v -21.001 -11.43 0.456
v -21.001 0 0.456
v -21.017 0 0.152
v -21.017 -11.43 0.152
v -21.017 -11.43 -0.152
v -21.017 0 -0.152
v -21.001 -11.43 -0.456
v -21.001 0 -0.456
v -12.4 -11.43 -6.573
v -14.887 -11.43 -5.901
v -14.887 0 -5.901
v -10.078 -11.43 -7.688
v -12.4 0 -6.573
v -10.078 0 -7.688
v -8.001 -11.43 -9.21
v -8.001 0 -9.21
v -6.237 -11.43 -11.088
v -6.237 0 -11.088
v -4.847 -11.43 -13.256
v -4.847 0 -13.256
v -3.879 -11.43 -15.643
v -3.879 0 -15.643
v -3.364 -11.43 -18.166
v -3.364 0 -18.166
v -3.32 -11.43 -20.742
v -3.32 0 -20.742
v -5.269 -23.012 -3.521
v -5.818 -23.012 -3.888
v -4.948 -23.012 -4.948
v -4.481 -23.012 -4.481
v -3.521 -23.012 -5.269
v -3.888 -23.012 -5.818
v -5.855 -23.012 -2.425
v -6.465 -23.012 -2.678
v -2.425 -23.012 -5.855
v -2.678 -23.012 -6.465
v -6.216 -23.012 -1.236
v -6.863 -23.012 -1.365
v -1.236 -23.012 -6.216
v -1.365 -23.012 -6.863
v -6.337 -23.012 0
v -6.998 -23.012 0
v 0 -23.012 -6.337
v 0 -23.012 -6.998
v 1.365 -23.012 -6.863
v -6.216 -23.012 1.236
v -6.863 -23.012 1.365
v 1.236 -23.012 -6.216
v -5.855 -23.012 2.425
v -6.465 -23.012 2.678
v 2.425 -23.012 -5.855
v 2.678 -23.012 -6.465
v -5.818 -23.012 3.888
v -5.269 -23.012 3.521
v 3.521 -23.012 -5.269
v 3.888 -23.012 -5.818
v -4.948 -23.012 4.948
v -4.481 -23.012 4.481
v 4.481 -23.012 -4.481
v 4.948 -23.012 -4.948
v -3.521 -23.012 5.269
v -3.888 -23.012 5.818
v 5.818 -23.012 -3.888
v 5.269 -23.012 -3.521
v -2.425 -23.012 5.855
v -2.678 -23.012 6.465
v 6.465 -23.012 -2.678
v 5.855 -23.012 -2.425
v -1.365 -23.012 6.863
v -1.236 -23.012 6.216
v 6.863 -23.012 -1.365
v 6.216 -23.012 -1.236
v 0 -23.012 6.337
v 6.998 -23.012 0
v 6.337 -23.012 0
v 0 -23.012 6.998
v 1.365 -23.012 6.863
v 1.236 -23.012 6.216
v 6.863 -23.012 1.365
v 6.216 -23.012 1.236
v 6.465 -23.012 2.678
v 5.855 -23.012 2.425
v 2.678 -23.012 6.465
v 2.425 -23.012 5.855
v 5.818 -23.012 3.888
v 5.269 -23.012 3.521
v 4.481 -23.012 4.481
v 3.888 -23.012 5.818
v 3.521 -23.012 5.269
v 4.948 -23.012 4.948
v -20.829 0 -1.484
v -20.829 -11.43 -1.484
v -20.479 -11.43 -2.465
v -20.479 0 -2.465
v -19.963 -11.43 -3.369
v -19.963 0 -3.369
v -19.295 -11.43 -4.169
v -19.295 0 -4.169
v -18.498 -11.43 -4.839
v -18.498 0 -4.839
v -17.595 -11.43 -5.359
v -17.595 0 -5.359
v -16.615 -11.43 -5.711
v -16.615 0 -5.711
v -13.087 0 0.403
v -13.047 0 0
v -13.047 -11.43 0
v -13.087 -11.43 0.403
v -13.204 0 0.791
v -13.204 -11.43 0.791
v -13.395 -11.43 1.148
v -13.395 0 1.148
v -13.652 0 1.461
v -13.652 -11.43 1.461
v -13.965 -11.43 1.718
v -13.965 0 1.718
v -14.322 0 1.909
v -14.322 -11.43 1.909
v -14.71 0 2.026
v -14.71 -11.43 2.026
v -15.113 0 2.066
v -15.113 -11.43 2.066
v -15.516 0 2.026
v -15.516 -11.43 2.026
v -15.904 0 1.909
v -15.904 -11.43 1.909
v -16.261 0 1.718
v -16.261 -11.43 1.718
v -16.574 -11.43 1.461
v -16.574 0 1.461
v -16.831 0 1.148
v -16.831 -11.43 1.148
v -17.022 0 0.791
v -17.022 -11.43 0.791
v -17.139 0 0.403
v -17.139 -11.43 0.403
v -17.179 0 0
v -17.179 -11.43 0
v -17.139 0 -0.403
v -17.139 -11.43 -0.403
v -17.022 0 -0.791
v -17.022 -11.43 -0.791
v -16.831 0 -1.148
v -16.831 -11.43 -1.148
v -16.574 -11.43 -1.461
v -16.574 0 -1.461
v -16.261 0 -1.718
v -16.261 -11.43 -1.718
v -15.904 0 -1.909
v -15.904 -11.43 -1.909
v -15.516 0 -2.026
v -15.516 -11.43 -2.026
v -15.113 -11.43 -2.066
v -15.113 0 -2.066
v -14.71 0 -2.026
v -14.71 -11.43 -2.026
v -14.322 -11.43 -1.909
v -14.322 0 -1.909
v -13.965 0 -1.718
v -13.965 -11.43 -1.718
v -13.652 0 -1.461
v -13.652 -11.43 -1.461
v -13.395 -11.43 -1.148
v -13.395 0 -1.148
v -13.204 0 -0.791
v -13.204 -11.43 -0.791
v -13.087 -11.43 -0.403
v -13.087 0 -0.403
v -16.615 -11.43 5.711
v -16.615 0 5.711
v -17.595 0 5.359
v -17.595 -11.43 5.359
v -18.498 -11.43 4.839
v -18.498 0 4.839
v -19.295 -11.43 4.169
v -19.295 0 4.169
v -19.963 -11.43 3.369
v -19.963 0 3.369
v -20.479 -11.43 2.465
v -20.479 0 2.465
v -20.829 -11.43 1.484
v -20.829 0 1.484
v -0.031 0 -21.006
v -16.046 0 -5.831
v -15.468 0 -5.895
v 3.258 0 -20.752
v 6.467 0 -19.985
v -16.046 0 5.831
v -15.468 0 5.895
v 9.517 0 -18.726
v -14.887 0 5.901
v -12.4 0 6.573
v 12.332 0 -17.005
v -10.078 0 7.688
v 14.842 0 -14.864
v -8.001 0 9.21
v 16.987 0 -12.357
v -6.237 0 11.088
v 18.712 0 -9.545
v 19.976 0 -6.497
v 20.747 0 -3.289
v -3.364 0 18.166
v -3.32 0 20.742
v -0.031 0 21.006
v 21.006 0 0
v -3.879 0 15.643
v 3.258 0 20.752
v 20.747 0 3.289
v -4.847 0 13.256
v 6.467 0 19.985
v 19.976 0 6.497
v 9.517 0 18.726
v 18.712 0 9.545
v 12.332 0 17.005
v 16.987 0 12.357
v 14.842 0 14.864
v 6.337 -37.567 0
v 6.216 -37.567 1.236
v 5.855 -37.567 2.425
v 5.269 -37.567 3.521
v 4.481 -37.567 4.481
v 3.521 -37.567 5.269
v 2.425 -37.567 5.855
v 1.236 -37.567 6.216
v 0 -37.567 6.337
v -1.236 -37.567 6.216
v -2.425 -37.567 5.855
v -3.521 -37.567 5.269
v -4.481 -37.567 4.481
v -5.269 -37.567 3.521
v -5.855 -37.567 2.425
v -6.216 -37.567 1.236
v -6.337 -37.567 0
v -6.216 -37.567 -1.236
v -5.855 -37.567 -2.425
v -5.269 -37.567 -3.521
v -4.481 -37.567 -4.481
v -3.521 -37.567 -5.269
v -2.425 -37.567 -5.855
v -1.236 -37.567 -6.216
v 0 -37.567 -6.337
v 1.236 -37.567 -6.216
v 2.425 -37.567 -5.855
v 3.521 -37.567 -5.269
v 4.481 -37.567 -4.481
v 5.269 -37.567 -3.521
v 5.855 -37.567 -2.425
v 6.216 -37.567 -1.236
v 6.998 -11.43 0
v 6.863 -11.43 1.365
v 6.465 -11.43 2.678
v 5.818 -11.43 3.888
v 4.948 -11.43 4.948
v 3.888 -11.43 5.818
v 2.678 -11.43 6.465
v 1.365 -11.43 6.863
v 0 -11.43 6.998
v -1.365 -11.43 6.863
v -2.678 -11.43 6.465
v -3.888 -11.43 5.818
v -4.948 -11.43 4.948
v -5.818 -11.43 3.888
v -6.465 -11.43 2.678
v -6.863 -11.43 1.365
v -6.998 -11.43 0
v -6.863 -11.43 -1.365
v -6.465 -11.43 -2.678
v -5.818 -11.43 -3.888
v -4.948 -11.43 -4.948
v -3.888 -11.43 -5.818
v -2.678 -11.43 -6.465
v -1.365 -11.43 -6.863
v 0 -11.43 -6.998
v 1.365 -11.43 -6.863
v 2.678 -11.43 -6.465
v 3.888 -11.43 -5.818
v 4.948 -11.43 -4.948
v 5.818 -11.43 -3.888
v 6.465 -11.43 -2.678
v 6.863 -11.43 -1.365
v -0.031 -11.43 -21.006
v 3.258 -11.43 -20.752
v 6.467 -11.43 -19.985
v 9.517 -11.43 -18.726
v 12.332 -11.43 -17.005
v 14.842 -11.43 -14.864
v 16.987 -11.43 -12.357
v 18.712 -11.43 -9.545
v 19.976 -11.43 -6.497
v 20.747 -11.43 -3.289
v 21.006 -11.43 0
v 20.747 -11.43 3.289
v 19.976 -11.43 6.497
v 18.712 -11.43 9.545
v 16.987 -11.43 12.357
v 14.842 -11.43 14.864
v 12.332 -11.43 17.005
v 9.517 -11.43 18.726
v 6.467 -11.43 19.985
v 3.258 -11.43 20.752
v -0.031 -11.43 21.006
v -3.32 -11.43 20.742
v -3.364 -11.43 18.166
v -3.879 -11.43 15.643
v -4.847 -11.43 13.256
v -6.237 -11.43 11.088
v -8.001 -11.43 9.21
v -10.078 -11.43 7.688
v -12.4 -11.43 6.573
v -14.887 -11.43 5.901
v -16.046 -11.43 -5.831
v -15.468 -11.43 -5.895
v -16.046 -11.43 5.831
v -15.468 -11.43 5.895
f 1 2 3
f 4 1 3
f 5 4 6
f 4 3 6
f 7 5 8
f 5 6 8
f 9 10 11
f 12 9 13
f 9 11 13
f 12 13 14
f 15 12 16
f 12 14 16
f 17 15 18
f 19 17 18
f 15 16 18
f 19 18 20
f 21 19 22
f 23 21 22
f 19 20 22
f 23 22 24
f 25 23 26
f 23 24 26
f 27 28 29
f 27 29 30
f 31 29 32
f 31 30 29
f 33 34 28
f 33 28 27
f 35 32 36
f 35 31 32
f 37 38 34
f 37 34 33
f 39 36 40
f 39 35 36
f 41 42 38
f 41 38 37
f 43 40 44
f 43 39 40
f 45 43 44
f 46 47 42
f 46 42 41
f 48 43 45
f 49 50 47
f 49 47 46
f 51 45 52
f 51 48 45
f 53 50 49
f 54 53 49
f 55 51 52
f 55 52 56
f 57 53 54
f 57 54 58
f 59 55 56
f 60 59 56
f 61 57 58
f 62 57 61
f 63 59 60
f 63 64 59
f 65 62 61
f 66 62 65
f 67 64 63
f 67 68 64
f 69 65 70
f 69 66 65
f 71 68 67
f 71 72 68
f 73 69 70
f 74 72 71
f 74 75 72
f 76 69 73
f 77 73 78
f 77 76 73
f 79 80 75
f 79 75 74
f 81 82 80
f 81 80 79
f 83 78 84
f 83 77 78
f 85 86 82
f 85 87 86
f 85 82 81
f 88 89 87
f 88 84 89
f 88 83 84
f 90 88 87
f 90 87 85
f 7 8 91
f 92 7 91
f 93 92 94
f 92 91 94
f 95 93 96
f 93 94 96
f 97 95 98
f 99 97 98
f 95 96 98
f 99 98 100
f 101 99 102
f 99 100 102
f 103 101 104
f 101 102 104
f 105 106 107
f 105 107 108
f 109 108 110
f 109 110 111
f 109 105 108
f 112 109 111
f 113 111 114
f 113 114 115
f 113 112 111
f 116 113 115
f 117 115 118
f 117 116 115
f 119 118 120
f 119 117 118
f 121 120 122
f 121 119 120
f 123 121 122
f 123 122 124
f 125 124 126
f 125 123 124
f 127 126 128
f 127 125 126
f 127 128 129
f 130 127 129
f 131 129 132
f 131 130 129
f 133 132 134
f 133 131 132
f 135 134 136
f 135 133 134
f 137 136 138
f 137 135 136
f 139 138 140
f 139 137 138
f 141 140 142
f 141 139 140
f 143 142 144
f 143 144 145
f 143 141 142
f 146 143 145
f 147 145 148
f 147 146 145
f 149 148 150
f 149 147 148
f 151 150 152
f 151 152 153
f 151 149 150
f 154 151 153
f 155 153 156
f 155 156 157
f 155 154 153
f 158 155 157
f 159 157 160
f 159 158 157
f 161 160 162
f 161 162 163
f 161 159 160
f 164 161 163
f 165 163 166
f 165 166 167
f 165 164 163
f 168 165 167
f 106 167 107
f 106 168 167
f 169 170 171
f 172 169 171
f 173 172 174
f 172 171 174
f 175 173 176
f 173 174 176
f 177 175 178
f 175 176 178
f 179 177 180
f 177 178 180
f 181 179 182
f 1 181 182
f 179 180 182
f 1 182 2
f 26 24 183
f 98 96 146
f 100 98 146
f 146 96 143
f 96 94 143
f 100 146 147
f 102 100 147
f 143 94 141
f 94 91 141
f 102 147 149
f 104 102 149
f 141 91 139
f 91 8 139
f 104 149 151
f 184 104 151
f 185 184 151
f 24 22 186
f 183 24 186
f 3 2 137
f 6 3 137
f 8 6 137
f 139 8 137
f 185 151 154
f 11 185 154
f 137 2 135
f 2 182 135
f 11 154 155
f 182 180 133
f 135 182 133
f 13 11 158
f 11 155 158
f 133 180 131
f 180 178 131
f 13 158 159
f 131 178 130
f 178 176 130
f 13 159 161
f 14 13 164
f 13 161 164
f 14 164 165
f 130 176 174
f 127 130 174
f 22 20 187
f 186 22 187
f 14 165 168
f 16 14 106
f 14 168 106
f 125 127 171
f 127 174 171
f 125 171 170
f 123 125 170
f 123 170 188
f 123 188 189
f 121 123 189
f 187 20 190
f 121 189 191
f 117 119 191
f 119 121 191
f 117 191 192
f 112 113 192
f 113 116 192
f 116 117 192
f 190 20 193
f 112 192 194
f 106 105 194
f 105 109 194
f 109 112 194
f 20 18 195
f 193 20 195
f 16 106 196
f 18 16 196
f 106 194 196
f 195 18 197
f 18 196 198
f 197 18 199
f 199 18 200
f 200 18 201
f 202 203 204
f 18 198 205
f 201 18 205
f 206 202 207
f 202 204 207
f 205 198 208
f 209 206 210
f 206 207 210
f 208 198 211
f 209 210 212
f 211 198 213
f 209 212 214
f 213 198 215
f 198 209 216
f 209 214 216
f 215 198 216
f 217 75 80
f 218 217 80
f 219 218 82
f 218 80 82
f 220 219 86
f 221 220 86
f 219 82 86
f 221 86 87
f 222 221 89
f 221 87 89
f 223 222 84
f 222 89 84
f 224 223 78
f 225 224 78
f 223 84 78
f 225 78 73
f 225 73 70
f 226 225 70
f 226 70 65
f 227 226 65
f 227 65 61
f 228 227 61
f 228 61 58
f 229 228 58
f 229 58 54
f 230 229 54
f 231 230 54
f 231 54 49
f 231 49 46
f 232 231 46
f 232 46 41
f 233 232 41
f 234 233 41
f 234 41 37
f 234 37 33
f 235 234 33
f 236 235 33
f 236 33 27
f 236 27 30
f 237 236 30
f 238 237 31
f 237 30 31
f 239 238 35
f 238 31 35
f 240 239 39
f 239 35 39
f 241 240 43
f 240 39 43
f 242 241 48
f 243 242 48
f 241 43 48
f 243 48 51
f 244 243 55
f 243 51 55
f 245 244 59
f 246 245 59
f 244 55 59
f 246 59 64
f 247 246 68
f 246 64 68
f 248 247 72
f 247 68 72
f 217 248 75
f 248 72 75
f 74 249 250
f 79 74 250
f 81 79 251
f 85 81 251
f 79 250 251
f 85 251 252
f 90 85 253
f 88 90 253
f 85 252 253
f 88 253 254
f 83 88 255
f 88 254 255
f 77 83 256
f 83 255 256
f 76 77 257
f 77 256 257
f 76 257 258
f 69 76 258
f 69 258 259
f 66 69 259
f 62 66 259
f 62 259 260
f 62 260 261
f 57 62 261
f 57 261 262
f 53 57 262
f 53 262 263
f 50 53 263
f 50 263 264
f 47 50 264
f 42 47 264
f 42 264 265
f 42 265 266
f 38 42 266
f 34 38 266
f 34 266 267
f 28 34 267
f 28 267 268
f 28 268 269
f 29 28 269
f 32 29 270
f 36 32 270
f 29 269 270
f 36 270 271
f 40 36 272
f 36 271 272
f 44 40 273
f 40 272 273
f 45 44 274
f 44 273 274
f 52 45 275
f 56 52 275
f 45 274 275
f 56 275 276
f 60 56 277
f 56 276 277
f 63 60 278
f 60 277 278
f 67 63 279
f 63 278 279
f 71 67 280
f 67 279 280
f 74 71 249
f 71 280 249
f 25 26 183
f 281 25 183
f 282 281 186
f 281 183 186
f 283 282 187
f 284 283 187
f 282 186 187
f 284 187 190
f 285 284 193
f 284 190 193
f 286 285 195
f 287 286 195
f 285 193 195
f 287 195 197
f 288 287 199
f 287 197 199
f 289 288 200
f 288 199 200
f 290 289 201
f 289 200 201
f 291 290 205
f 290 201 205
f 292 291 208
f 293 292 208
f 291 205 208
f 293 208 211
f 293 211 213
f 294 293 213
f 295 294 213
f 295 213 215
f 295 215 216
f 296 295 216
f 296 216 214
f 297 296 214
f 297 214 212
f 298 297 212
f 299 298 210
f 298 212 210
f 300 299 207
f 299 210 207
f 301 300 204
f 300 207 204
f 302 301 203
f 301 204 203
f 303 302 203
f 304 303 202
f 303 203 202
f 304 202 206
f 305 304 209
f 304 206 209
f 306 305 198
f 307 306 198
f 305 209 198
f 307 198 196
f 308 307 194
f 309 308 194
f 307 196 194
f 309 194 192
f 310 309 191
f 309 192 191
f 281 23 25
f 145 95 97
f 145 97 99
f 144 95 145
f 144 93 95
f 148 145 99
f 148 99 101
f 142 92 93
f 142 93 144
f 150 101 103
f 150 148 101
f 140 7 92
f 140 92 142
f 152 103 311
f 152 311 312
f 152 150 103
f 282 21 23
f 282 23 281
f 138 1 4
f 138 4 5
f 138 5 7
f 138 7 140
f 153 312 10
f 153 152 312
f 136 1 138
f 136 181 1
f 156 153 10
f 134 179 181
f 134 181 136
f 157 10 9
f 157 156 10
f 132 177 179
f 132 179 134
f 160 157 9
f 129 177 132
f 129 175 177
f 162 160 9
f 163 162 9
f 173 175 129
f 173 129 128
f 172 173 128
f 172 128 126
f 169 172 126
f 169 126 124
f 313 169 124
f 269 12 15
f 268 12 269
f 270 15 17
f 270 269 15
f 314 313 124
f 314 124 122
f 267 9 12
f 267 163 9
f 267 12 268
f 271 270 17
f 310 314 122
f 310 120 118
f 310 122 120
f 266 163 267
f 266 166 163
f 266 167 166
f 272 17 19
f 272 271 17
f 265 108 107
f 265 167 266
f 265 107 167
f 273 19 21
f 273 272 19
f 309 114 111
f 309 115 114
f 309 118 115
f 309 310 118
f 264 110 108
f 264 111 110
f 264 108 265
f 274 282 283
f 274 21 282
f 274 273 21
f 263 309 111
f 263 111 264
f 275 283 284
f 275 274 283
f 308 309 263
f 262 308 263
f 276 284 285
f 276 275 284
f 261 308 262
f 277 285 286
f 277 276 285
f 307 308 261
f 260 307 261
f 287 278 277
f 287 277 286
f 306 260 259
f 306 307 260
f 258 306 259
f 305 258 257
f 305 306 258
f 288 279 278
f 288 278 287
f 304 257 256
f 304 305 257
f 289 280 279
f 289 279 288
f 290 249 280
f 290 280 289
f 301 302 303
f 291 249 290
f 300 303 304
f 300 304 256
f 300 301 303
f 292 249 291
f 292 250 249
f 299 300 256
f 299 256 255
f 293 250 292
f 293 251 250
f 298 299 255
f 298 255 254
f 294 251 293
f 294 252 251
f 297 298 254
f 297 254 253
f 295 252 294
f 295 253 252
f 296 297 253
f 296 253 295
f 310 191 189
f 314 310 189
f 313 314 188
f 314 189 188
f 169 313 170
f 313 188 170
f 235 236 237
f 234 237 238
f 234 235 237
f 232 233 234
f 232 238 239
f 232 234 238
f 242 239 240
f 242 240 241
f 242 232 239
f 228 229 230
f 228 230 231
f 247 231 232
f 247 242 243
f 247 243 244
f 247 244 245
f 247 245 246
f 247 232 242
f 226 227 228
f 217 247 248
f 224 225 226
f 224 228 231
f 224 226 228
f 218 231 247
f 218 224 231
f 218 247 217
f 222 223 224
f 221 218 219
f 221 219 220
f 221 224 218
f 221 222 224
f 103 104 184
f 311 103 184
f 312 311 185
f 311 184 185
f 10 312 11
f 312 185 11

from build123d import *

# Parameters (mm, degrees)
F0_R     = 2.065749
F0_R_2   = 6.9977
F1_DEPTH = 11.43
F0_R_3   = 6.3373
F2_DEPTH = 23.0124
F3_DEPTH = 37.5666


with BuildPart() as f1:
    # F0 (on Front) → F1 (new body)
    with BuildSketch(Plane.XZ):
        with BuildLine():
            ThreePointArc((-14.886502, -5.901155), (-6.237069, -11.087668), (-3.319826, -20.741803))
            ThreePointArc((-3.319826, -20.741803), (21.0058, 0), (-3.319826, 20.741803))
            ThreePointArc((-3.319826, 20.741803), (-6.237069, 11.087668), (-14.886502, 5.901155))
            ThreePointArc((-14.886502, 5.901155), (-15.747764, 5.779367), (-16.614929, 5.711317))
            ThreePointArc((-16.614929, 5.711317), (-19.646861, 3.78405), (-21.000843, 0.456331))
            ThreePointArc((-21.000843, 0.456331), (-21.0058, 0), (-21.000843, -0.456331))
            ThreePointArc((-21.000843, -0.456331), (-19.646861, -3.78405), (-16.614929, -5.711317))
            ThreePointArc((-16.614929, -5.711317), (-15.747764, -5.779367), (-14.886502, -5.901155))
        make_face()
        with Locations((-15.113, 0)):
            Circle(F0_R, mode=Mode.SUBTRACT)
        Circle(F0_R_2, mode=Mode.SUBTRACT)
        with BuildLine():
            ThreePointArc((-16.614929, -5.711317), (-15.757741, -5.870199), (-14.886502, -5.901155))
            ThreePointArc((-14.886502, -5.901155), (-15.747764, -5.779367), (-16.614929, -5.711317))
        make_face()
        with BuildLine():
            ThreePointArc((-16.614929, 5.711317), (-15.747764, 5.779367), (-14.886502, 5.901155))
            ThreePointArc((-14.886502, 5.901155), (-15.757741, 5.870199), (-16.614929, 5.711317))
        make_face()
        with BuildLine():
            ThreePointArc((-21.000843, 0.456331), (-21.0185, 0), (-21.000843, -0.456331))
            ThreePointArc((-21.000843, -0.456331), (-21.0058, 0), (-21.000843, 0.456331))
        make_face()
    extrude(amount=F1_DEPTH)

    # F0 (on Front) → F2 (join)
    with BuildSketch(Plane.XZ):
        Circle(F0_R_2)
        Circle(F0_R_3, mode=Mode.SUBTRACT)
    extrude(amount=F2_DEPTH)

    # F0 (on Front) → F3 (join)
    with BuildSketch(Plane.XZ):
        Circle(F0_R_3)
    extrude(amount=F3_DEPTH)


solid = f1.part
